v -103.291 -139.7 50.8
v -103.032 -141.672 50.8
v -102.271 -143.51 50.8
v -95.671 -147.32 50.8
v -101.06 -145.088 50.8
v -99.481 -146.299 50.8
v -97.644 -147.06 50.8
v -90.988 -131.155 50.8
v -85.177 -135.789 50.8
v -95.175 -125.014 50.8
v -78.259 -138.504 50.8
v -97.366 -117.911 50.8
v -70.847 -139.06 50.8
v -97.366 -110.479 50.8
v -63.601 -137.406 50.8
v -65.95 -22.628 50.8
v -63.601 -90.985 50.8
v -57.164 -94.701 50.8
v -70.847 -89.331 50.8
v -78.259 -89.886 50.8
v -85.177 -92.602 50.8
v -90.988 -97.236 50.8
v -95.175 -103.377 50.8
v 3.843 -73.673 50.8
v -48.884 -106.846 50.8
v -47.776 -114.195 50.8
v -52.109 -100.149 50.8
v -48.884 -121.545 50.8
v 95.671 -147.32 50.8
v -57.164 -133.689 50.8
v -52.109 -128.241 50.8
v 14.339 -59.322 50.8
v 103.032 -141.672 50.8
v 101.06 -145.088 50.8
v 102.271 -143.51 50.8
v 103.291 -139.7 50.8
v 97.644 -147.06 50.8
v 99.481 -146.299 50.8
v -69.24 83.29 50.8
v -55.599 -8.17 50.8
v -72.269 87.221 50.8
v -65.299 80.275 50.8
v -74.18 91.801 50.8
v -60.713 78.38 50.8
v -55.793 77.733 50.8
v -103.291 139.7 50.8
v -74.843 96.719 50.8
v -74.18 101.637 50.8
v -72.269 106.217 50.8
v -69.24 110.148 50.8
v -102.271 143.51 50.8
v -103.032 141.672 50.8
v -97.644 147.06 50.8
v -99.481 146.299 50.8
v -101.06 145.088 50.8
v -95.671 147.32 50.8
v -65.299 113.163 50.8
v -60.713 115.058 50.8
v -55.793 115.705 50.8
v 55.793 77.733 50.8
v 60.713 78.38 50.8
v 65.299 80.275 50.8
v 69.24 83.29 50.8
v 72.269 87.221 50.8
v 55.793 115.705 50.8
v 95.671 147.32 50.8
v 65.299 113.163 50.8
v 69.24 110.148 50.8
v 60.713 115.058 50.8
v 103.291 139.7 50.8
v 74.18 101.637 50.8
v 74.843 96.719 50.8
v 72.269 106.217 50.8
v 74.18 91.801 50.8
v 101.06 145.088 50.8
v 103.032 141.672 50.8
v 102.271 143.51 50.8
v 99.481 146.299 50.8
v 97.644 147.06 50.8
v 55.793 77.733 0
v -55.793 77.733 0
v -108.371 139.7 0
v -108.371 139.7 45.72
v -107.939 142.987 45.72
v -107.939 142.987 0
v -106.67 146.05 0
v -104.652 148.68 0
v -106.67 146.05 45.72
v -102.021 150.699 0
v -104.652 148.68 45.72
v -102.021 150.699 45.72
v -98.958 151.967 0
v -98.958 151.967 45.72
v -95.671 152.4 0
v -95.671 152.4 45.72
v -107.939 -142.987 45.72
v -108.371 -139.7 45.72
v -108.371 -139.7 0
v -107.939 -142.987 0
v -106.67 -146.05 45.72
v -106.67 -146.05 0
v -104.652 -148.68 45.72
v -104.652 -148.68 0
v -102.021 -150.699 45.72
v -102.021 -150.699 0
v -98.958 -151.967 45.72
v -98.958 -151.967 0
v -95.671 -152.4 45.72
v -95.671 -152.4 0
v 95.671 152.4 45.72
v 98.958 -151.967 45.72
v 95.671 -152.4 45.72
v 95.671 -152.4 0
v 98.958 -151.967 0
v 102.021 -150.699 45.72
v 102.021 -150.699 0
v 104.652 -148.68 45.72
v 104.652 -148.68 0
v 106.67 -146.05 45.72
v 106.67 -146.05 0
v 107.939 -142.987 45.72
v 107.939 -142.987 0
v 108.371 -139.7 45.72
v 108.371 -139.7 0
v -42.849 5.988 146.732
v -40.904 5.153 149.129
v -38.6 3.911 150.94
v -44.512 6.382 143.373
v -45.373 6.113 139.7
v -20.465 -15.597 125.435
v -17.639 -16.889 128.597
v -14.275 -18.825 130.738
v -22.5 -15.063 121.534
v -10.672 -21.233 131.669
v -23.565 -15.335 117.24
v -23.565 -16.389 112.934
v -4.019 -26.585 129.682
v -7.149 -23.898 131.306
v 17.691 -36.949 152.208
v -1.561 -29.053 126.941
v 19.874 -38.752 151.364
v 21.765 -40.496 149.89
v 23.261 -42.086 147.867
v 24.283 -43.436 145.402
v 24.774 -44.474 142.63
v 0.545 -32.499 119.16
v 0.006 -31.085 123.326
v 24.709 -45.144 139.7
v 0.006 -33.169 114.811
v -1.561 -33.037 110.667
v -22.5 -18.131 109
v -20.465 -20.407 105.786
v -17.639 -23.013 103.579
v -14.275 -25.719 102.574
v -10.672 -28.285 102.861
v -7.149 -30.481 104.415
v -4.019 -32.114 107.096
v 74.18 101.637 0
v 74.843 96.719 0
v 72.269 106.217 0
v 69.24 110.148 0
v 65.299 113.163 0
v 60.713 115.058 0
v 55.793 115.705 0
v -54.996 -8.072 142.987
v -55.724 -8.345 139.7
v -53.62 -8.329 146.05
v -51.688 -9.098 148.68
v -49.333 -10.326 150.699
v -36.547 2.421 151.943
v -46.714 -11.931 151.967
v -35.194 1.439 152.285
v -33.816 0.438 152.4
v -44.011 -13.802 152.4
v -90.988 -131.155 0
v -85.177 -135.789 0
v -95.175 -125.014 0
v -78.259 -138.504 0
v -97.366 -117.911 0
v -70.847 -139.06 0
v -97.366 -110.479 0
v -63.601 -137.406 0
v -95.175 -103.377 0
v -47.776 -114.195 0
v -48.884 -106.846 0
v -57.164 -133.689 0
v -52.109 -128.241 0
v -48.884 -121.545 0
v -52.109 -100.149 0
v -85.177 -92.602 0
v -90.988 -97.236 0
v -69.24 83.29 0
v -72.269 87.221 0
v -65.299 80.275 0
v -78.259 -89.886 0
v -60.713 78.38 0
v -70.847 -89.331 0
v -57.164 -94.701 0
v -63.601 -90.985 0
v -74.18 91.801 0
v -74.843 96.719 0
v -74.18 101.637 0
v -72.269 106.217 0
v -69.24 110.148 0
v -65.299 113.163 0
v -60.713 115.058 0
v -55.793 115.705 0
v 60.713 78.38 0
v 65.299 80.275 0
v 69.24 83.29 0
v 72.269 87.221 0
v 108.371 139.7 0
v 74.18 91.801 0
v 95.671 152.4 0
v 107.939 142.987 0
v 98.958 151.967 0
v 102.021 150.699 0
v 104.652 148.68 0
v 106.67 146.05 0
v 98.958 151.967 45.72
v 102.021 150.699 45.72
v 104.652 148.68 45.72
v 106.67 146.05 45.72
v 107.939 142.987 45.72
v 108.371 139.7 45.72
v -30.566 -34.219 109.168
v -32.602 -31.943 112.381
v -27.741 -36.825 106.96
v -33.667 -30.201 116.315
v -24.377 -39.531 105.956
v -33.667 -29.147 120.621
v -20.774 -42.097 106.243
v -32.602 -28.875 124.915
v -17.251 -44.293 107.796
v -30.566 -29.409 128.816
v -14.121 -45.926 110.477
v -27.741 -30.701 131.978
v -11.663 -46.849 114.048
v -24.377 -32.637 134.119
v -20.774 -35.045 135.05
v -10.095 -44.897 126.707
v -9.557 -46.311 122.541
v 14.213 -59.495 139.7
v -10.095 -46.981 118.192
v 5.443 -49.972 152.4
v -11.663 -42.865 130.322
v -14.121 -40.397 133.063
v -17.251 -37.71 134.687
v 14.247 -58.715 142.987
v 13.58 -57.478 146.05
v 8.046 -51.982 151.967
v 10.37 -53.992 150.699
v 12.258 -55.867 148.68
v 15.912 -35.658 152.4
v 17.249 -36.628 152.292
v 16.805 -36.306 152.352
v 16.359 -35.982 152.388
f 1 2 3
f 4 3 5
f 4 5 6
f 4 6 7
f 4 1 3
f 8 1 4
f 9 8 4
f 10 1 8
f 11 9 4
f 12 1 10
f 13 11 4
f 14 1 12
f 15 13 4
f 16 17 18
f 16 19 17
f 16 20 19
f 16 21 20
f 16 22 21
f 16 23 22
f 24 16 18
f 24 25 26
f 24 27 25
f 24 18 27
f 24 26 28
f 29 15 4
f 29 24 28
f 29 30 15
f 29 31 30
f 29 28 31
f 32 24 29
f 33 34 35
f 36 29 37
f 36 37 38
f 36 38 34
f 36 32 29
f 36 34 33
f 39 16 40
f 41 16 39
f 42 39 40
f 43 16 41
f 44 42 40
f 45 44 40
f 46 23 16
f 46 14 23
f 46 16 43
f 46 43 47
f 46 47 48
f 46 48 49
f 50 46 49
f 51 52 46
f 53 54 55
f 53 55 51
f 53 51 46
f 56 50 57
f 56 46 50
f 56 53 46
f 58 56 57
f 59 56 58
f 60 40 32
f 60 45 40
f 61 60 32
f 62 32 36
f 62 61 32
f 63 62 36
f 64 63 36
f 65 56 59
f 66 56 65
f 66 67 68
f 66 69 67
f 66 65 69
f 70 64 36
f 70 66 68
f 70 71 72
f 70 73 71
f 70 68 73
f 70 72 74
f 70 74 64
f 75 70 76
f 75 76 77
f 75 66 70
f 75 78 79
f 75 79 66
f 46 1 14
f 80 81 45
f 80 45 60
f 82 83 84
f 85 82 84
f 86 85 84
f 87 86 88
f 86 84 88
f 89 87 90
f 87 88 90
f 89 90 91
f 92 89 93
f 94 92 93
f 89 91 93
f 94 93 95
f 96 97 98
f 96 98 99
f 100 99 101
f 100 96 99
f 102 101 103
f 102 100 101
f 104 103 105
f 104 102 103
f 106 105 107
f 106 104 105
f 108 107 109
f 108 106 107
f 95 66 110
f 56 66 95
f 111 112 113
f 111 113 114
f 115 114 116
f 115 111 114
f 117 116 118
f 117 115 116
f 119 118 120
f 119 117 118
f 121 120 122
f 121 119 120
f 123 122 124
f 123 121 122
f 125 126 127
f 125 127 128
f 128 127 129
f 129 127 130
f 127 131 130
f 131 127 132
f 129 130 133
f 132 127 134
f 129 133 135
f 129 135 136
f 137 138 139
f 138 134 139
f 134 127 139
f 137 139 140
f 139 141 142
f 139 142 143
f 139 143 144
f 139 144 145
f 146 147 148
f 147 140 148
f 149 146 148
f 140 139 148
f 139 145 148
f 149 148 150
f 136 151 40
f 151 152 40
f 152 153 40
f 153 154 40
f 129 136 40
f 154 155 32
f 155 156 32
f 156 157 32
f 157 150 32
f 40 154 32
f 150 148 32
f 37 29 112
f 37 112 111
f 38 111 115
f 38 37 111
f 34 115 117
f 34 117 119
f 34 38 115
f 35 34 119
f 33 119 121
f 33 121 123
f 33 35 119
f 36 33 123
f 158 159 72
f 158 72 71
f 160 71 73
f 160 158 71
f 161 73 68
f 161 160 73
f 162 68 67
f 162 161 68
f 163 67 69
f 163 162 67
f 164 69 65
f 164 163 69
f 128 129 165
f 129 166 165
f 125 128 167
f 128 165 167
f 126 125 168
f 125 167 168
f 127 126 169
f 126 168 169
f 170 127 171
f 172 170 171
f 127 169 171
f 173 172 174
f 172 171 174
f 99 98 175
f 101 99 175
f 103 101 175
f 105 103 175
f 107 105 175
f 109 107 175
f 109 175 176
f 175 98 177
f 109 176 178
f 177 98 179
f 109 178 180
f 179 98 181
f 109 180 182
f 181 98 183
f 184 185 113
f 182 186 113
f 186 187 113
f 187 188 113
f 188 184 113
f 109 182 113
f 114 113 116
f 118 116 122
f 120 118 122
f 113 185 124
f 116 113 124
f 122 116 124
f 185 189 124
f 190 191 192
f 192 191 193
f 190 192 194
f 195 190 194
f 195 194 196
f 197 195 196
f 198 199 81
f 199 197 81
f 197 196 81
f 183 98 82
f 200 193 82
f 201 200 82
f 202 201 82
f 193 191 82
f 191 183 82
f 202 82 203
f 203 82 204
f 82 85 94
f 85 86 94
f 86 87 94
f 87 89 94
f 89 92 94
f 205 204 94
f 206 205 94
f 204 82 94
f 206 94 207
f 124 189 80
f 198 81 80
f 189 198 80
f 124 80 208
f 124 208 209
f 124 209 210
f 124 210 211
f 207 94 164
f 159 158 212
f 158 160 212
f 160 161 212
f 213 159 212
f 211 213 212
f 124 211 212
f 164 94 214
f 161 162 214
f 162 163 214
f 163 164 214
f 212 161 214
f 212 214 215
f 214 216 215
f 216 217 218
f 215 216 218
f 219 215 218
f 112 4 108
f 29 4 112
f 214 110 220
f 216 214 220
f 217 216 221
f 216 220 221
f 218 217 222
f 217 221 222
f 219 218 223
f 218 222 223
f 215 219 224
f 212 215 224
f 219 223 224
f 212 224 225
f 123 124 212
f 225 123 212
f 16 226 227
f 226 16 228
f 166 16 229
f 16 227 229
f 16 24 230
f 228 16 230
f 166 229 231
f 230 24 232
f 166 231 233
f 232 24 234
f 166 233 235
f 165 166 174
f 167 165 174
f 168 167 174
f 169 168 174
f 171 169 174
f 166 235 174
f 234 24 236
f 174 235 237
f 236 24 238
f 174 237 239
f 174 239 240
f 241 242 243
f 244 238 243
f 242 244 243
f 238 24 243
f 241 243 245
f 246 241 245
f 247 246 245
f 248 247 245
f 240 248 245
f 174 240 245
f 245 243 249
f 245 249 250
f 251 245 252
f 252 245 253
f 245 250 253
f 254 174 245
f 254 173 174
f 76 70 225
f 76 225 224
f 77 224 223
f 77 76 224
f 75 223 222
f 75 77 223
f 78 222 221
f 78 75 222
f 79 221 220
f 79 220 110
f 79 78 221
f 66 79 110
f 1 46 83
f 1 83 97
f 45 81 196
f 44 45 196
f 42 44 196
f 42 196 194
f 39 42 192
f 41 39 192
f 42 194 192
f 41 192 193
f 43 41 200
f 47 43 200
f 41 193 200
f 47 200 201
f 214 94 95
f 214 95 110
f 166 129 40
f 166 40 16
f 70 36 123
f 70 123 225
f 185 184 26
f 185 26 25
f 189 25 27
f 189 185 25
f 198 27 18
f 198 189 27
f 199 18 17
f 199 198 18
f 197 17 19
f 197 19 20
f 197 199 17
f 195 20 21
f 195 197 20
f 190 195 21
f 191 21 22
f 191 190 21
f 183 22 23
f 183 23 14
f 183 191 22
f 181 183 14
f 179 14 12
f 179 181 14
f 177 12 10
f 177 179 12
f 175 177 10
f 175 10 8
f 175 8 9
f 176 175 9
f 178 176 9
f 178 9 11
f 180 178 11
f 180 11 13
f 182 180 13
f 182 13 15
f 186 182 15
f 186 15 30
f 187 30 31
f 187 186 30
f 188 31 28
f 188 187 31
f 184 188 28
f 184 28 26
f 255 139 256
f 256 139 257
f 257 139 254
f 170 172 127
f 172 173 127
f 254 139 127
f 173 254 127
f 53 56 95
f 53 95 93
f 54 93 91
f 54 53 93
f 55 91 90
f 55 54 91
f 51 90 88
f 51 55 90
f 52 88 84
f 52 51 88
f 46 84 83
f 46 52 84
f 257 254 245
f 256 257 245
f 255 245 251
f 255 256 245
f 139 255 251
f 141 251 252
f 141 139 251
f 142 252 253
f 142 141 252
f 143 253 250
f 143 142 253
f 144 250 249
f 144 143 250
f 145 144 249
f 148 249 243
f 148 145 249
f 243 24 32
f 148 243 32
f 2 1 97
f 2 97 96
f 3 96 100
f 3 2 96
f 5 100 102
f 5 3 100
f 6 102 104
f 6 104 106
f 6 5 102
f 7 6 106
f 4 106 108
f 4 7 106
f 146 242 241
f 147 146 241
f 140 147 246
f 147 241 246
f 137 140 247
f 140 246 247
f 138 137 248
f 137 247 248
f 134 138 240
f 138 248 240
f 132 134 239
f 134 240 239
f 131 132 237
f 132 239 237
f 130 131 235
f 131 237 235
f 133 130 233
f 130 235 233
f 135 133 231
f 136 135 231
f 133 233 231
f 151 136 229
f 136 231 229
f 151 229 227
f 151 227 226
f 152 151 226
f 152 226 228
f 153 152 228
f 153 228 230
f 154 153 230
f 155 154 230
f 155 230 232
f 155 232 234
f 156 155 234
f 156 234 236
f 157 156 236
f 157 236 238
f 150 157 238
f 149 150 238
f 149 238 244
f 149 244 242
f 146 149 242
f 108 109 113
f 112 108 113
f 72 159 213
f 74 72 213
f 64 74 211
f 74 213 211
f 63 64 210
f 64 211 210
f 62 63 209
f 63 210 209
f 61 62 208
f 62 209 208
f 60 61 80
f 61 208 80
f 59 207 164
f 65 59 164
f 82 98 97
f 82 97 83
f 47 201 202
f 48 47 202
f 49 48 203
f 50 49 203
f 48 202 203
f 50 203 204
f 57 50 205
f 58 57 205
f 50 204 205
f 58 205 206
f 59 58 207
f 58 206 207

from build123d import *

# Parameters (mm, degrees)
F0_W        = 216.7427750782
F0_H        = 304.8
F0_R        = 24.9340536108
F0_W_2      = 149.6857404709
F0_H_2      = 37.9712283611
F1_DEPTH    = 50.8
F2_T1_DEPTH = 50.8
F3_R        = 12.7
F4_SIZE     = 5.08
F6_DEPTH    = 101.6
F6_FACE1_W  = 86.0803631253
F6_FACE1_H  = 101.6
F9_DEPTH    = 101.6
F10_R       = 12.7
F11_R       = 14.8705082973
F12_DEPTH   = 25.4


# Not quite as in the source:
# - a fillet or chamfer that OpenCascade refuses, or shapes differently, is made with other operations: its cross-section is extruded or revolved along the edge and cut away or added


with BuildPart() as f1:
    # F0 (on Top) → F1 (new body)
    with BuildSketch(Plane.XY):
        Rectangle(F0_W, F0_H)
        with Locations((-72.7102532983, -114.1952574253)):
            Circle(F0_R, mode=Mode.SUBTRACT)
        with Locations((0, 96.7190787196)):
            Rectangle(F0_W_2, F0_H_2, mode=Mode.SUBTRACT)
    extrude(amount=F1_DEPTH)

    # F2: fillet of radius 19.05 on 4 edges, made by hand

    # F2_s2 → F2_t1 (join)
    with BuildSketch(Plane.XY):
        with BuildLine():
            ThreePointArc((-74.8428702354, 96.6546929002), (-69.263254417, 110.1250770818), (-55.7928702354, 115.7046929002))
            Line((-55.7928702354, 115.7046929002), (-74.8428702354, 115.7046929002))
            Line((-74.8428702354, 115.7046929002), (-74.8428702354, 96.6546929002))
        make_face()
        with BuildLine():
            ThreePointArc((-55.7928702354, 77.7334645391), (-69.263254417, 83.3130803574), (-74.8428702354, 96.7834645391))
            Line((-74.8428702354, 96.7834645391), (-74.8428702354, 77.7334645391))
            Line((-74.8428702354, 77.7334645391), (-55.7928702354, 77.7334645391))
        make_face()
        with BuildLine():
            ThreePointArc((74.8428702354, 96.7834645391), (69.263254417, 83.3130803574), (55.7928702354, 77.7334645391))
            Line((55.7928702354, 77.7334645391), (74.8428702354, 77.7334645391))
            Line((74.8428702354, 77.7334645391), (74.8428702354, 96.7834645391))
        make_face()
        with BuildLine():
            ThreePointArc((74.8428702354, 96.6546929002), (69.263254417, 110.1250770818), (55.7928702354, 115.7046929002))
            Line((55.7928702354, 115.7046929002), (74.8428702354, 115.7046929002))
            Line((74.8428702354, 115.7046929002), (74.8428702354, 96.6546929002))
        make_face()
    extrude(amount=F2_T1_DEPTH)

    # F3
    f3_edges = [f1.edges().sort_by_distance(p)[0] for p in [
        (108.371388, 152.4, 25.4),
        (-108.371388, 152.4, 25.4),
        (-108.371388, -152.4, 25.4),
        (108.371388, -152.4, 25.4),
    ]]
    fillet(f3_edges, radius=F3_R)

    # F4
    f4_edges = [f1.edges().sort_by_distance(p)[0] for p in [
        (0, -152.4, 50.8),
        (108.371388, 0, 50.8),
        (104.651644, -148.680256, 50.8),
        (-108.371388, 0, 50.8),
        (-104.651644, -148.680256, 50.8),
        (-104.651644, 148.680256, 50.8),
        (0, 152.4, 50.8),
        (104.651644, 148.680256, 50.8),
    ]]
    chamfer(f4_edges, length=F4_SIZE)

    # F5 (on face) → F6 (join)
    with BuildSketch(Plane.XY.offset(50.8)):
        Polygon((26.1903759085, -43.1183193231), (-44.0938870282, 7.8987490062), (-88.495139861, -54.1171146365), (-18.5043358385, -104.2281540196), align=None)
    extrude(amount=F6_DEPTH)

    # F7 (on face) + F6_face1 (on face) → F9 (cut)
    with BuildSketch(Plane(origin=(37.6086943592, -27.5063704871, 0), x_dir=(0.590339639, 0.8071549484, 0), z_dir=(0.8071549484, -0.590339639, 0))):
        Polygon((-57.197030481, 50.8), (-37.1219477484, 152.4), (-95.0521132136, 152.4), (-95.0521132136, 50.8), align=None)
        Polygon((-19.3419477484, 50.8), (-19.3419477484, 152.4), (-39.417030481, 50.8), align=None)
    with BuildSketch(Plane(origin=(-53.4997378497, -79.172634328, 101.6), x_dir=(0.8130867655, -0.5821425185, 0), z_dir=(-0.5821425185, -0.8130867655, 0))):
        Rectangle(F6_FACE1_W, F6_FACE1_H)
    extrude(amount=-F9_DEPTH, dir=(0.8071549484, -0.590339639, 0), mode=Mode.SUBTRACT)

    # F10 (call 1 of 2: OpenCascade refuses the feature's edges together)
    f10_edges = [f1.edges().sort_by_distance(p)[0] for p in [
        (20.942257, -50.293927, 152.4),
    ]]
    fillet(f10_edges, radius=F10_R)

    # F10#2 (call 2 of 2)
    f10_2_edges = [f1.edges().sort_by_distance(p)[0] for p in [
        (-49.178316, 0.797255, 152.4),
    ]]
    fillet(f10_2_edges, radius=F10_R)

    # F11 (on face) → F12 (cut)
    with BuildSketch(Plane(origin=(-38.199850732, -52.2295921019, 12.7856660343), x_dir=(0.8152262825, -0.5625326873, 0.1377065143), z_dir=(-0.5791425631, -0.7918454983, 0.1938416841))):
        with Locations((20.26450634, 108.0148071051)):
            Circle(F11_R)
    extrude(amount=-F12_DEPTH, mode=Mode.SUBTRACT)


solid = f1.part
